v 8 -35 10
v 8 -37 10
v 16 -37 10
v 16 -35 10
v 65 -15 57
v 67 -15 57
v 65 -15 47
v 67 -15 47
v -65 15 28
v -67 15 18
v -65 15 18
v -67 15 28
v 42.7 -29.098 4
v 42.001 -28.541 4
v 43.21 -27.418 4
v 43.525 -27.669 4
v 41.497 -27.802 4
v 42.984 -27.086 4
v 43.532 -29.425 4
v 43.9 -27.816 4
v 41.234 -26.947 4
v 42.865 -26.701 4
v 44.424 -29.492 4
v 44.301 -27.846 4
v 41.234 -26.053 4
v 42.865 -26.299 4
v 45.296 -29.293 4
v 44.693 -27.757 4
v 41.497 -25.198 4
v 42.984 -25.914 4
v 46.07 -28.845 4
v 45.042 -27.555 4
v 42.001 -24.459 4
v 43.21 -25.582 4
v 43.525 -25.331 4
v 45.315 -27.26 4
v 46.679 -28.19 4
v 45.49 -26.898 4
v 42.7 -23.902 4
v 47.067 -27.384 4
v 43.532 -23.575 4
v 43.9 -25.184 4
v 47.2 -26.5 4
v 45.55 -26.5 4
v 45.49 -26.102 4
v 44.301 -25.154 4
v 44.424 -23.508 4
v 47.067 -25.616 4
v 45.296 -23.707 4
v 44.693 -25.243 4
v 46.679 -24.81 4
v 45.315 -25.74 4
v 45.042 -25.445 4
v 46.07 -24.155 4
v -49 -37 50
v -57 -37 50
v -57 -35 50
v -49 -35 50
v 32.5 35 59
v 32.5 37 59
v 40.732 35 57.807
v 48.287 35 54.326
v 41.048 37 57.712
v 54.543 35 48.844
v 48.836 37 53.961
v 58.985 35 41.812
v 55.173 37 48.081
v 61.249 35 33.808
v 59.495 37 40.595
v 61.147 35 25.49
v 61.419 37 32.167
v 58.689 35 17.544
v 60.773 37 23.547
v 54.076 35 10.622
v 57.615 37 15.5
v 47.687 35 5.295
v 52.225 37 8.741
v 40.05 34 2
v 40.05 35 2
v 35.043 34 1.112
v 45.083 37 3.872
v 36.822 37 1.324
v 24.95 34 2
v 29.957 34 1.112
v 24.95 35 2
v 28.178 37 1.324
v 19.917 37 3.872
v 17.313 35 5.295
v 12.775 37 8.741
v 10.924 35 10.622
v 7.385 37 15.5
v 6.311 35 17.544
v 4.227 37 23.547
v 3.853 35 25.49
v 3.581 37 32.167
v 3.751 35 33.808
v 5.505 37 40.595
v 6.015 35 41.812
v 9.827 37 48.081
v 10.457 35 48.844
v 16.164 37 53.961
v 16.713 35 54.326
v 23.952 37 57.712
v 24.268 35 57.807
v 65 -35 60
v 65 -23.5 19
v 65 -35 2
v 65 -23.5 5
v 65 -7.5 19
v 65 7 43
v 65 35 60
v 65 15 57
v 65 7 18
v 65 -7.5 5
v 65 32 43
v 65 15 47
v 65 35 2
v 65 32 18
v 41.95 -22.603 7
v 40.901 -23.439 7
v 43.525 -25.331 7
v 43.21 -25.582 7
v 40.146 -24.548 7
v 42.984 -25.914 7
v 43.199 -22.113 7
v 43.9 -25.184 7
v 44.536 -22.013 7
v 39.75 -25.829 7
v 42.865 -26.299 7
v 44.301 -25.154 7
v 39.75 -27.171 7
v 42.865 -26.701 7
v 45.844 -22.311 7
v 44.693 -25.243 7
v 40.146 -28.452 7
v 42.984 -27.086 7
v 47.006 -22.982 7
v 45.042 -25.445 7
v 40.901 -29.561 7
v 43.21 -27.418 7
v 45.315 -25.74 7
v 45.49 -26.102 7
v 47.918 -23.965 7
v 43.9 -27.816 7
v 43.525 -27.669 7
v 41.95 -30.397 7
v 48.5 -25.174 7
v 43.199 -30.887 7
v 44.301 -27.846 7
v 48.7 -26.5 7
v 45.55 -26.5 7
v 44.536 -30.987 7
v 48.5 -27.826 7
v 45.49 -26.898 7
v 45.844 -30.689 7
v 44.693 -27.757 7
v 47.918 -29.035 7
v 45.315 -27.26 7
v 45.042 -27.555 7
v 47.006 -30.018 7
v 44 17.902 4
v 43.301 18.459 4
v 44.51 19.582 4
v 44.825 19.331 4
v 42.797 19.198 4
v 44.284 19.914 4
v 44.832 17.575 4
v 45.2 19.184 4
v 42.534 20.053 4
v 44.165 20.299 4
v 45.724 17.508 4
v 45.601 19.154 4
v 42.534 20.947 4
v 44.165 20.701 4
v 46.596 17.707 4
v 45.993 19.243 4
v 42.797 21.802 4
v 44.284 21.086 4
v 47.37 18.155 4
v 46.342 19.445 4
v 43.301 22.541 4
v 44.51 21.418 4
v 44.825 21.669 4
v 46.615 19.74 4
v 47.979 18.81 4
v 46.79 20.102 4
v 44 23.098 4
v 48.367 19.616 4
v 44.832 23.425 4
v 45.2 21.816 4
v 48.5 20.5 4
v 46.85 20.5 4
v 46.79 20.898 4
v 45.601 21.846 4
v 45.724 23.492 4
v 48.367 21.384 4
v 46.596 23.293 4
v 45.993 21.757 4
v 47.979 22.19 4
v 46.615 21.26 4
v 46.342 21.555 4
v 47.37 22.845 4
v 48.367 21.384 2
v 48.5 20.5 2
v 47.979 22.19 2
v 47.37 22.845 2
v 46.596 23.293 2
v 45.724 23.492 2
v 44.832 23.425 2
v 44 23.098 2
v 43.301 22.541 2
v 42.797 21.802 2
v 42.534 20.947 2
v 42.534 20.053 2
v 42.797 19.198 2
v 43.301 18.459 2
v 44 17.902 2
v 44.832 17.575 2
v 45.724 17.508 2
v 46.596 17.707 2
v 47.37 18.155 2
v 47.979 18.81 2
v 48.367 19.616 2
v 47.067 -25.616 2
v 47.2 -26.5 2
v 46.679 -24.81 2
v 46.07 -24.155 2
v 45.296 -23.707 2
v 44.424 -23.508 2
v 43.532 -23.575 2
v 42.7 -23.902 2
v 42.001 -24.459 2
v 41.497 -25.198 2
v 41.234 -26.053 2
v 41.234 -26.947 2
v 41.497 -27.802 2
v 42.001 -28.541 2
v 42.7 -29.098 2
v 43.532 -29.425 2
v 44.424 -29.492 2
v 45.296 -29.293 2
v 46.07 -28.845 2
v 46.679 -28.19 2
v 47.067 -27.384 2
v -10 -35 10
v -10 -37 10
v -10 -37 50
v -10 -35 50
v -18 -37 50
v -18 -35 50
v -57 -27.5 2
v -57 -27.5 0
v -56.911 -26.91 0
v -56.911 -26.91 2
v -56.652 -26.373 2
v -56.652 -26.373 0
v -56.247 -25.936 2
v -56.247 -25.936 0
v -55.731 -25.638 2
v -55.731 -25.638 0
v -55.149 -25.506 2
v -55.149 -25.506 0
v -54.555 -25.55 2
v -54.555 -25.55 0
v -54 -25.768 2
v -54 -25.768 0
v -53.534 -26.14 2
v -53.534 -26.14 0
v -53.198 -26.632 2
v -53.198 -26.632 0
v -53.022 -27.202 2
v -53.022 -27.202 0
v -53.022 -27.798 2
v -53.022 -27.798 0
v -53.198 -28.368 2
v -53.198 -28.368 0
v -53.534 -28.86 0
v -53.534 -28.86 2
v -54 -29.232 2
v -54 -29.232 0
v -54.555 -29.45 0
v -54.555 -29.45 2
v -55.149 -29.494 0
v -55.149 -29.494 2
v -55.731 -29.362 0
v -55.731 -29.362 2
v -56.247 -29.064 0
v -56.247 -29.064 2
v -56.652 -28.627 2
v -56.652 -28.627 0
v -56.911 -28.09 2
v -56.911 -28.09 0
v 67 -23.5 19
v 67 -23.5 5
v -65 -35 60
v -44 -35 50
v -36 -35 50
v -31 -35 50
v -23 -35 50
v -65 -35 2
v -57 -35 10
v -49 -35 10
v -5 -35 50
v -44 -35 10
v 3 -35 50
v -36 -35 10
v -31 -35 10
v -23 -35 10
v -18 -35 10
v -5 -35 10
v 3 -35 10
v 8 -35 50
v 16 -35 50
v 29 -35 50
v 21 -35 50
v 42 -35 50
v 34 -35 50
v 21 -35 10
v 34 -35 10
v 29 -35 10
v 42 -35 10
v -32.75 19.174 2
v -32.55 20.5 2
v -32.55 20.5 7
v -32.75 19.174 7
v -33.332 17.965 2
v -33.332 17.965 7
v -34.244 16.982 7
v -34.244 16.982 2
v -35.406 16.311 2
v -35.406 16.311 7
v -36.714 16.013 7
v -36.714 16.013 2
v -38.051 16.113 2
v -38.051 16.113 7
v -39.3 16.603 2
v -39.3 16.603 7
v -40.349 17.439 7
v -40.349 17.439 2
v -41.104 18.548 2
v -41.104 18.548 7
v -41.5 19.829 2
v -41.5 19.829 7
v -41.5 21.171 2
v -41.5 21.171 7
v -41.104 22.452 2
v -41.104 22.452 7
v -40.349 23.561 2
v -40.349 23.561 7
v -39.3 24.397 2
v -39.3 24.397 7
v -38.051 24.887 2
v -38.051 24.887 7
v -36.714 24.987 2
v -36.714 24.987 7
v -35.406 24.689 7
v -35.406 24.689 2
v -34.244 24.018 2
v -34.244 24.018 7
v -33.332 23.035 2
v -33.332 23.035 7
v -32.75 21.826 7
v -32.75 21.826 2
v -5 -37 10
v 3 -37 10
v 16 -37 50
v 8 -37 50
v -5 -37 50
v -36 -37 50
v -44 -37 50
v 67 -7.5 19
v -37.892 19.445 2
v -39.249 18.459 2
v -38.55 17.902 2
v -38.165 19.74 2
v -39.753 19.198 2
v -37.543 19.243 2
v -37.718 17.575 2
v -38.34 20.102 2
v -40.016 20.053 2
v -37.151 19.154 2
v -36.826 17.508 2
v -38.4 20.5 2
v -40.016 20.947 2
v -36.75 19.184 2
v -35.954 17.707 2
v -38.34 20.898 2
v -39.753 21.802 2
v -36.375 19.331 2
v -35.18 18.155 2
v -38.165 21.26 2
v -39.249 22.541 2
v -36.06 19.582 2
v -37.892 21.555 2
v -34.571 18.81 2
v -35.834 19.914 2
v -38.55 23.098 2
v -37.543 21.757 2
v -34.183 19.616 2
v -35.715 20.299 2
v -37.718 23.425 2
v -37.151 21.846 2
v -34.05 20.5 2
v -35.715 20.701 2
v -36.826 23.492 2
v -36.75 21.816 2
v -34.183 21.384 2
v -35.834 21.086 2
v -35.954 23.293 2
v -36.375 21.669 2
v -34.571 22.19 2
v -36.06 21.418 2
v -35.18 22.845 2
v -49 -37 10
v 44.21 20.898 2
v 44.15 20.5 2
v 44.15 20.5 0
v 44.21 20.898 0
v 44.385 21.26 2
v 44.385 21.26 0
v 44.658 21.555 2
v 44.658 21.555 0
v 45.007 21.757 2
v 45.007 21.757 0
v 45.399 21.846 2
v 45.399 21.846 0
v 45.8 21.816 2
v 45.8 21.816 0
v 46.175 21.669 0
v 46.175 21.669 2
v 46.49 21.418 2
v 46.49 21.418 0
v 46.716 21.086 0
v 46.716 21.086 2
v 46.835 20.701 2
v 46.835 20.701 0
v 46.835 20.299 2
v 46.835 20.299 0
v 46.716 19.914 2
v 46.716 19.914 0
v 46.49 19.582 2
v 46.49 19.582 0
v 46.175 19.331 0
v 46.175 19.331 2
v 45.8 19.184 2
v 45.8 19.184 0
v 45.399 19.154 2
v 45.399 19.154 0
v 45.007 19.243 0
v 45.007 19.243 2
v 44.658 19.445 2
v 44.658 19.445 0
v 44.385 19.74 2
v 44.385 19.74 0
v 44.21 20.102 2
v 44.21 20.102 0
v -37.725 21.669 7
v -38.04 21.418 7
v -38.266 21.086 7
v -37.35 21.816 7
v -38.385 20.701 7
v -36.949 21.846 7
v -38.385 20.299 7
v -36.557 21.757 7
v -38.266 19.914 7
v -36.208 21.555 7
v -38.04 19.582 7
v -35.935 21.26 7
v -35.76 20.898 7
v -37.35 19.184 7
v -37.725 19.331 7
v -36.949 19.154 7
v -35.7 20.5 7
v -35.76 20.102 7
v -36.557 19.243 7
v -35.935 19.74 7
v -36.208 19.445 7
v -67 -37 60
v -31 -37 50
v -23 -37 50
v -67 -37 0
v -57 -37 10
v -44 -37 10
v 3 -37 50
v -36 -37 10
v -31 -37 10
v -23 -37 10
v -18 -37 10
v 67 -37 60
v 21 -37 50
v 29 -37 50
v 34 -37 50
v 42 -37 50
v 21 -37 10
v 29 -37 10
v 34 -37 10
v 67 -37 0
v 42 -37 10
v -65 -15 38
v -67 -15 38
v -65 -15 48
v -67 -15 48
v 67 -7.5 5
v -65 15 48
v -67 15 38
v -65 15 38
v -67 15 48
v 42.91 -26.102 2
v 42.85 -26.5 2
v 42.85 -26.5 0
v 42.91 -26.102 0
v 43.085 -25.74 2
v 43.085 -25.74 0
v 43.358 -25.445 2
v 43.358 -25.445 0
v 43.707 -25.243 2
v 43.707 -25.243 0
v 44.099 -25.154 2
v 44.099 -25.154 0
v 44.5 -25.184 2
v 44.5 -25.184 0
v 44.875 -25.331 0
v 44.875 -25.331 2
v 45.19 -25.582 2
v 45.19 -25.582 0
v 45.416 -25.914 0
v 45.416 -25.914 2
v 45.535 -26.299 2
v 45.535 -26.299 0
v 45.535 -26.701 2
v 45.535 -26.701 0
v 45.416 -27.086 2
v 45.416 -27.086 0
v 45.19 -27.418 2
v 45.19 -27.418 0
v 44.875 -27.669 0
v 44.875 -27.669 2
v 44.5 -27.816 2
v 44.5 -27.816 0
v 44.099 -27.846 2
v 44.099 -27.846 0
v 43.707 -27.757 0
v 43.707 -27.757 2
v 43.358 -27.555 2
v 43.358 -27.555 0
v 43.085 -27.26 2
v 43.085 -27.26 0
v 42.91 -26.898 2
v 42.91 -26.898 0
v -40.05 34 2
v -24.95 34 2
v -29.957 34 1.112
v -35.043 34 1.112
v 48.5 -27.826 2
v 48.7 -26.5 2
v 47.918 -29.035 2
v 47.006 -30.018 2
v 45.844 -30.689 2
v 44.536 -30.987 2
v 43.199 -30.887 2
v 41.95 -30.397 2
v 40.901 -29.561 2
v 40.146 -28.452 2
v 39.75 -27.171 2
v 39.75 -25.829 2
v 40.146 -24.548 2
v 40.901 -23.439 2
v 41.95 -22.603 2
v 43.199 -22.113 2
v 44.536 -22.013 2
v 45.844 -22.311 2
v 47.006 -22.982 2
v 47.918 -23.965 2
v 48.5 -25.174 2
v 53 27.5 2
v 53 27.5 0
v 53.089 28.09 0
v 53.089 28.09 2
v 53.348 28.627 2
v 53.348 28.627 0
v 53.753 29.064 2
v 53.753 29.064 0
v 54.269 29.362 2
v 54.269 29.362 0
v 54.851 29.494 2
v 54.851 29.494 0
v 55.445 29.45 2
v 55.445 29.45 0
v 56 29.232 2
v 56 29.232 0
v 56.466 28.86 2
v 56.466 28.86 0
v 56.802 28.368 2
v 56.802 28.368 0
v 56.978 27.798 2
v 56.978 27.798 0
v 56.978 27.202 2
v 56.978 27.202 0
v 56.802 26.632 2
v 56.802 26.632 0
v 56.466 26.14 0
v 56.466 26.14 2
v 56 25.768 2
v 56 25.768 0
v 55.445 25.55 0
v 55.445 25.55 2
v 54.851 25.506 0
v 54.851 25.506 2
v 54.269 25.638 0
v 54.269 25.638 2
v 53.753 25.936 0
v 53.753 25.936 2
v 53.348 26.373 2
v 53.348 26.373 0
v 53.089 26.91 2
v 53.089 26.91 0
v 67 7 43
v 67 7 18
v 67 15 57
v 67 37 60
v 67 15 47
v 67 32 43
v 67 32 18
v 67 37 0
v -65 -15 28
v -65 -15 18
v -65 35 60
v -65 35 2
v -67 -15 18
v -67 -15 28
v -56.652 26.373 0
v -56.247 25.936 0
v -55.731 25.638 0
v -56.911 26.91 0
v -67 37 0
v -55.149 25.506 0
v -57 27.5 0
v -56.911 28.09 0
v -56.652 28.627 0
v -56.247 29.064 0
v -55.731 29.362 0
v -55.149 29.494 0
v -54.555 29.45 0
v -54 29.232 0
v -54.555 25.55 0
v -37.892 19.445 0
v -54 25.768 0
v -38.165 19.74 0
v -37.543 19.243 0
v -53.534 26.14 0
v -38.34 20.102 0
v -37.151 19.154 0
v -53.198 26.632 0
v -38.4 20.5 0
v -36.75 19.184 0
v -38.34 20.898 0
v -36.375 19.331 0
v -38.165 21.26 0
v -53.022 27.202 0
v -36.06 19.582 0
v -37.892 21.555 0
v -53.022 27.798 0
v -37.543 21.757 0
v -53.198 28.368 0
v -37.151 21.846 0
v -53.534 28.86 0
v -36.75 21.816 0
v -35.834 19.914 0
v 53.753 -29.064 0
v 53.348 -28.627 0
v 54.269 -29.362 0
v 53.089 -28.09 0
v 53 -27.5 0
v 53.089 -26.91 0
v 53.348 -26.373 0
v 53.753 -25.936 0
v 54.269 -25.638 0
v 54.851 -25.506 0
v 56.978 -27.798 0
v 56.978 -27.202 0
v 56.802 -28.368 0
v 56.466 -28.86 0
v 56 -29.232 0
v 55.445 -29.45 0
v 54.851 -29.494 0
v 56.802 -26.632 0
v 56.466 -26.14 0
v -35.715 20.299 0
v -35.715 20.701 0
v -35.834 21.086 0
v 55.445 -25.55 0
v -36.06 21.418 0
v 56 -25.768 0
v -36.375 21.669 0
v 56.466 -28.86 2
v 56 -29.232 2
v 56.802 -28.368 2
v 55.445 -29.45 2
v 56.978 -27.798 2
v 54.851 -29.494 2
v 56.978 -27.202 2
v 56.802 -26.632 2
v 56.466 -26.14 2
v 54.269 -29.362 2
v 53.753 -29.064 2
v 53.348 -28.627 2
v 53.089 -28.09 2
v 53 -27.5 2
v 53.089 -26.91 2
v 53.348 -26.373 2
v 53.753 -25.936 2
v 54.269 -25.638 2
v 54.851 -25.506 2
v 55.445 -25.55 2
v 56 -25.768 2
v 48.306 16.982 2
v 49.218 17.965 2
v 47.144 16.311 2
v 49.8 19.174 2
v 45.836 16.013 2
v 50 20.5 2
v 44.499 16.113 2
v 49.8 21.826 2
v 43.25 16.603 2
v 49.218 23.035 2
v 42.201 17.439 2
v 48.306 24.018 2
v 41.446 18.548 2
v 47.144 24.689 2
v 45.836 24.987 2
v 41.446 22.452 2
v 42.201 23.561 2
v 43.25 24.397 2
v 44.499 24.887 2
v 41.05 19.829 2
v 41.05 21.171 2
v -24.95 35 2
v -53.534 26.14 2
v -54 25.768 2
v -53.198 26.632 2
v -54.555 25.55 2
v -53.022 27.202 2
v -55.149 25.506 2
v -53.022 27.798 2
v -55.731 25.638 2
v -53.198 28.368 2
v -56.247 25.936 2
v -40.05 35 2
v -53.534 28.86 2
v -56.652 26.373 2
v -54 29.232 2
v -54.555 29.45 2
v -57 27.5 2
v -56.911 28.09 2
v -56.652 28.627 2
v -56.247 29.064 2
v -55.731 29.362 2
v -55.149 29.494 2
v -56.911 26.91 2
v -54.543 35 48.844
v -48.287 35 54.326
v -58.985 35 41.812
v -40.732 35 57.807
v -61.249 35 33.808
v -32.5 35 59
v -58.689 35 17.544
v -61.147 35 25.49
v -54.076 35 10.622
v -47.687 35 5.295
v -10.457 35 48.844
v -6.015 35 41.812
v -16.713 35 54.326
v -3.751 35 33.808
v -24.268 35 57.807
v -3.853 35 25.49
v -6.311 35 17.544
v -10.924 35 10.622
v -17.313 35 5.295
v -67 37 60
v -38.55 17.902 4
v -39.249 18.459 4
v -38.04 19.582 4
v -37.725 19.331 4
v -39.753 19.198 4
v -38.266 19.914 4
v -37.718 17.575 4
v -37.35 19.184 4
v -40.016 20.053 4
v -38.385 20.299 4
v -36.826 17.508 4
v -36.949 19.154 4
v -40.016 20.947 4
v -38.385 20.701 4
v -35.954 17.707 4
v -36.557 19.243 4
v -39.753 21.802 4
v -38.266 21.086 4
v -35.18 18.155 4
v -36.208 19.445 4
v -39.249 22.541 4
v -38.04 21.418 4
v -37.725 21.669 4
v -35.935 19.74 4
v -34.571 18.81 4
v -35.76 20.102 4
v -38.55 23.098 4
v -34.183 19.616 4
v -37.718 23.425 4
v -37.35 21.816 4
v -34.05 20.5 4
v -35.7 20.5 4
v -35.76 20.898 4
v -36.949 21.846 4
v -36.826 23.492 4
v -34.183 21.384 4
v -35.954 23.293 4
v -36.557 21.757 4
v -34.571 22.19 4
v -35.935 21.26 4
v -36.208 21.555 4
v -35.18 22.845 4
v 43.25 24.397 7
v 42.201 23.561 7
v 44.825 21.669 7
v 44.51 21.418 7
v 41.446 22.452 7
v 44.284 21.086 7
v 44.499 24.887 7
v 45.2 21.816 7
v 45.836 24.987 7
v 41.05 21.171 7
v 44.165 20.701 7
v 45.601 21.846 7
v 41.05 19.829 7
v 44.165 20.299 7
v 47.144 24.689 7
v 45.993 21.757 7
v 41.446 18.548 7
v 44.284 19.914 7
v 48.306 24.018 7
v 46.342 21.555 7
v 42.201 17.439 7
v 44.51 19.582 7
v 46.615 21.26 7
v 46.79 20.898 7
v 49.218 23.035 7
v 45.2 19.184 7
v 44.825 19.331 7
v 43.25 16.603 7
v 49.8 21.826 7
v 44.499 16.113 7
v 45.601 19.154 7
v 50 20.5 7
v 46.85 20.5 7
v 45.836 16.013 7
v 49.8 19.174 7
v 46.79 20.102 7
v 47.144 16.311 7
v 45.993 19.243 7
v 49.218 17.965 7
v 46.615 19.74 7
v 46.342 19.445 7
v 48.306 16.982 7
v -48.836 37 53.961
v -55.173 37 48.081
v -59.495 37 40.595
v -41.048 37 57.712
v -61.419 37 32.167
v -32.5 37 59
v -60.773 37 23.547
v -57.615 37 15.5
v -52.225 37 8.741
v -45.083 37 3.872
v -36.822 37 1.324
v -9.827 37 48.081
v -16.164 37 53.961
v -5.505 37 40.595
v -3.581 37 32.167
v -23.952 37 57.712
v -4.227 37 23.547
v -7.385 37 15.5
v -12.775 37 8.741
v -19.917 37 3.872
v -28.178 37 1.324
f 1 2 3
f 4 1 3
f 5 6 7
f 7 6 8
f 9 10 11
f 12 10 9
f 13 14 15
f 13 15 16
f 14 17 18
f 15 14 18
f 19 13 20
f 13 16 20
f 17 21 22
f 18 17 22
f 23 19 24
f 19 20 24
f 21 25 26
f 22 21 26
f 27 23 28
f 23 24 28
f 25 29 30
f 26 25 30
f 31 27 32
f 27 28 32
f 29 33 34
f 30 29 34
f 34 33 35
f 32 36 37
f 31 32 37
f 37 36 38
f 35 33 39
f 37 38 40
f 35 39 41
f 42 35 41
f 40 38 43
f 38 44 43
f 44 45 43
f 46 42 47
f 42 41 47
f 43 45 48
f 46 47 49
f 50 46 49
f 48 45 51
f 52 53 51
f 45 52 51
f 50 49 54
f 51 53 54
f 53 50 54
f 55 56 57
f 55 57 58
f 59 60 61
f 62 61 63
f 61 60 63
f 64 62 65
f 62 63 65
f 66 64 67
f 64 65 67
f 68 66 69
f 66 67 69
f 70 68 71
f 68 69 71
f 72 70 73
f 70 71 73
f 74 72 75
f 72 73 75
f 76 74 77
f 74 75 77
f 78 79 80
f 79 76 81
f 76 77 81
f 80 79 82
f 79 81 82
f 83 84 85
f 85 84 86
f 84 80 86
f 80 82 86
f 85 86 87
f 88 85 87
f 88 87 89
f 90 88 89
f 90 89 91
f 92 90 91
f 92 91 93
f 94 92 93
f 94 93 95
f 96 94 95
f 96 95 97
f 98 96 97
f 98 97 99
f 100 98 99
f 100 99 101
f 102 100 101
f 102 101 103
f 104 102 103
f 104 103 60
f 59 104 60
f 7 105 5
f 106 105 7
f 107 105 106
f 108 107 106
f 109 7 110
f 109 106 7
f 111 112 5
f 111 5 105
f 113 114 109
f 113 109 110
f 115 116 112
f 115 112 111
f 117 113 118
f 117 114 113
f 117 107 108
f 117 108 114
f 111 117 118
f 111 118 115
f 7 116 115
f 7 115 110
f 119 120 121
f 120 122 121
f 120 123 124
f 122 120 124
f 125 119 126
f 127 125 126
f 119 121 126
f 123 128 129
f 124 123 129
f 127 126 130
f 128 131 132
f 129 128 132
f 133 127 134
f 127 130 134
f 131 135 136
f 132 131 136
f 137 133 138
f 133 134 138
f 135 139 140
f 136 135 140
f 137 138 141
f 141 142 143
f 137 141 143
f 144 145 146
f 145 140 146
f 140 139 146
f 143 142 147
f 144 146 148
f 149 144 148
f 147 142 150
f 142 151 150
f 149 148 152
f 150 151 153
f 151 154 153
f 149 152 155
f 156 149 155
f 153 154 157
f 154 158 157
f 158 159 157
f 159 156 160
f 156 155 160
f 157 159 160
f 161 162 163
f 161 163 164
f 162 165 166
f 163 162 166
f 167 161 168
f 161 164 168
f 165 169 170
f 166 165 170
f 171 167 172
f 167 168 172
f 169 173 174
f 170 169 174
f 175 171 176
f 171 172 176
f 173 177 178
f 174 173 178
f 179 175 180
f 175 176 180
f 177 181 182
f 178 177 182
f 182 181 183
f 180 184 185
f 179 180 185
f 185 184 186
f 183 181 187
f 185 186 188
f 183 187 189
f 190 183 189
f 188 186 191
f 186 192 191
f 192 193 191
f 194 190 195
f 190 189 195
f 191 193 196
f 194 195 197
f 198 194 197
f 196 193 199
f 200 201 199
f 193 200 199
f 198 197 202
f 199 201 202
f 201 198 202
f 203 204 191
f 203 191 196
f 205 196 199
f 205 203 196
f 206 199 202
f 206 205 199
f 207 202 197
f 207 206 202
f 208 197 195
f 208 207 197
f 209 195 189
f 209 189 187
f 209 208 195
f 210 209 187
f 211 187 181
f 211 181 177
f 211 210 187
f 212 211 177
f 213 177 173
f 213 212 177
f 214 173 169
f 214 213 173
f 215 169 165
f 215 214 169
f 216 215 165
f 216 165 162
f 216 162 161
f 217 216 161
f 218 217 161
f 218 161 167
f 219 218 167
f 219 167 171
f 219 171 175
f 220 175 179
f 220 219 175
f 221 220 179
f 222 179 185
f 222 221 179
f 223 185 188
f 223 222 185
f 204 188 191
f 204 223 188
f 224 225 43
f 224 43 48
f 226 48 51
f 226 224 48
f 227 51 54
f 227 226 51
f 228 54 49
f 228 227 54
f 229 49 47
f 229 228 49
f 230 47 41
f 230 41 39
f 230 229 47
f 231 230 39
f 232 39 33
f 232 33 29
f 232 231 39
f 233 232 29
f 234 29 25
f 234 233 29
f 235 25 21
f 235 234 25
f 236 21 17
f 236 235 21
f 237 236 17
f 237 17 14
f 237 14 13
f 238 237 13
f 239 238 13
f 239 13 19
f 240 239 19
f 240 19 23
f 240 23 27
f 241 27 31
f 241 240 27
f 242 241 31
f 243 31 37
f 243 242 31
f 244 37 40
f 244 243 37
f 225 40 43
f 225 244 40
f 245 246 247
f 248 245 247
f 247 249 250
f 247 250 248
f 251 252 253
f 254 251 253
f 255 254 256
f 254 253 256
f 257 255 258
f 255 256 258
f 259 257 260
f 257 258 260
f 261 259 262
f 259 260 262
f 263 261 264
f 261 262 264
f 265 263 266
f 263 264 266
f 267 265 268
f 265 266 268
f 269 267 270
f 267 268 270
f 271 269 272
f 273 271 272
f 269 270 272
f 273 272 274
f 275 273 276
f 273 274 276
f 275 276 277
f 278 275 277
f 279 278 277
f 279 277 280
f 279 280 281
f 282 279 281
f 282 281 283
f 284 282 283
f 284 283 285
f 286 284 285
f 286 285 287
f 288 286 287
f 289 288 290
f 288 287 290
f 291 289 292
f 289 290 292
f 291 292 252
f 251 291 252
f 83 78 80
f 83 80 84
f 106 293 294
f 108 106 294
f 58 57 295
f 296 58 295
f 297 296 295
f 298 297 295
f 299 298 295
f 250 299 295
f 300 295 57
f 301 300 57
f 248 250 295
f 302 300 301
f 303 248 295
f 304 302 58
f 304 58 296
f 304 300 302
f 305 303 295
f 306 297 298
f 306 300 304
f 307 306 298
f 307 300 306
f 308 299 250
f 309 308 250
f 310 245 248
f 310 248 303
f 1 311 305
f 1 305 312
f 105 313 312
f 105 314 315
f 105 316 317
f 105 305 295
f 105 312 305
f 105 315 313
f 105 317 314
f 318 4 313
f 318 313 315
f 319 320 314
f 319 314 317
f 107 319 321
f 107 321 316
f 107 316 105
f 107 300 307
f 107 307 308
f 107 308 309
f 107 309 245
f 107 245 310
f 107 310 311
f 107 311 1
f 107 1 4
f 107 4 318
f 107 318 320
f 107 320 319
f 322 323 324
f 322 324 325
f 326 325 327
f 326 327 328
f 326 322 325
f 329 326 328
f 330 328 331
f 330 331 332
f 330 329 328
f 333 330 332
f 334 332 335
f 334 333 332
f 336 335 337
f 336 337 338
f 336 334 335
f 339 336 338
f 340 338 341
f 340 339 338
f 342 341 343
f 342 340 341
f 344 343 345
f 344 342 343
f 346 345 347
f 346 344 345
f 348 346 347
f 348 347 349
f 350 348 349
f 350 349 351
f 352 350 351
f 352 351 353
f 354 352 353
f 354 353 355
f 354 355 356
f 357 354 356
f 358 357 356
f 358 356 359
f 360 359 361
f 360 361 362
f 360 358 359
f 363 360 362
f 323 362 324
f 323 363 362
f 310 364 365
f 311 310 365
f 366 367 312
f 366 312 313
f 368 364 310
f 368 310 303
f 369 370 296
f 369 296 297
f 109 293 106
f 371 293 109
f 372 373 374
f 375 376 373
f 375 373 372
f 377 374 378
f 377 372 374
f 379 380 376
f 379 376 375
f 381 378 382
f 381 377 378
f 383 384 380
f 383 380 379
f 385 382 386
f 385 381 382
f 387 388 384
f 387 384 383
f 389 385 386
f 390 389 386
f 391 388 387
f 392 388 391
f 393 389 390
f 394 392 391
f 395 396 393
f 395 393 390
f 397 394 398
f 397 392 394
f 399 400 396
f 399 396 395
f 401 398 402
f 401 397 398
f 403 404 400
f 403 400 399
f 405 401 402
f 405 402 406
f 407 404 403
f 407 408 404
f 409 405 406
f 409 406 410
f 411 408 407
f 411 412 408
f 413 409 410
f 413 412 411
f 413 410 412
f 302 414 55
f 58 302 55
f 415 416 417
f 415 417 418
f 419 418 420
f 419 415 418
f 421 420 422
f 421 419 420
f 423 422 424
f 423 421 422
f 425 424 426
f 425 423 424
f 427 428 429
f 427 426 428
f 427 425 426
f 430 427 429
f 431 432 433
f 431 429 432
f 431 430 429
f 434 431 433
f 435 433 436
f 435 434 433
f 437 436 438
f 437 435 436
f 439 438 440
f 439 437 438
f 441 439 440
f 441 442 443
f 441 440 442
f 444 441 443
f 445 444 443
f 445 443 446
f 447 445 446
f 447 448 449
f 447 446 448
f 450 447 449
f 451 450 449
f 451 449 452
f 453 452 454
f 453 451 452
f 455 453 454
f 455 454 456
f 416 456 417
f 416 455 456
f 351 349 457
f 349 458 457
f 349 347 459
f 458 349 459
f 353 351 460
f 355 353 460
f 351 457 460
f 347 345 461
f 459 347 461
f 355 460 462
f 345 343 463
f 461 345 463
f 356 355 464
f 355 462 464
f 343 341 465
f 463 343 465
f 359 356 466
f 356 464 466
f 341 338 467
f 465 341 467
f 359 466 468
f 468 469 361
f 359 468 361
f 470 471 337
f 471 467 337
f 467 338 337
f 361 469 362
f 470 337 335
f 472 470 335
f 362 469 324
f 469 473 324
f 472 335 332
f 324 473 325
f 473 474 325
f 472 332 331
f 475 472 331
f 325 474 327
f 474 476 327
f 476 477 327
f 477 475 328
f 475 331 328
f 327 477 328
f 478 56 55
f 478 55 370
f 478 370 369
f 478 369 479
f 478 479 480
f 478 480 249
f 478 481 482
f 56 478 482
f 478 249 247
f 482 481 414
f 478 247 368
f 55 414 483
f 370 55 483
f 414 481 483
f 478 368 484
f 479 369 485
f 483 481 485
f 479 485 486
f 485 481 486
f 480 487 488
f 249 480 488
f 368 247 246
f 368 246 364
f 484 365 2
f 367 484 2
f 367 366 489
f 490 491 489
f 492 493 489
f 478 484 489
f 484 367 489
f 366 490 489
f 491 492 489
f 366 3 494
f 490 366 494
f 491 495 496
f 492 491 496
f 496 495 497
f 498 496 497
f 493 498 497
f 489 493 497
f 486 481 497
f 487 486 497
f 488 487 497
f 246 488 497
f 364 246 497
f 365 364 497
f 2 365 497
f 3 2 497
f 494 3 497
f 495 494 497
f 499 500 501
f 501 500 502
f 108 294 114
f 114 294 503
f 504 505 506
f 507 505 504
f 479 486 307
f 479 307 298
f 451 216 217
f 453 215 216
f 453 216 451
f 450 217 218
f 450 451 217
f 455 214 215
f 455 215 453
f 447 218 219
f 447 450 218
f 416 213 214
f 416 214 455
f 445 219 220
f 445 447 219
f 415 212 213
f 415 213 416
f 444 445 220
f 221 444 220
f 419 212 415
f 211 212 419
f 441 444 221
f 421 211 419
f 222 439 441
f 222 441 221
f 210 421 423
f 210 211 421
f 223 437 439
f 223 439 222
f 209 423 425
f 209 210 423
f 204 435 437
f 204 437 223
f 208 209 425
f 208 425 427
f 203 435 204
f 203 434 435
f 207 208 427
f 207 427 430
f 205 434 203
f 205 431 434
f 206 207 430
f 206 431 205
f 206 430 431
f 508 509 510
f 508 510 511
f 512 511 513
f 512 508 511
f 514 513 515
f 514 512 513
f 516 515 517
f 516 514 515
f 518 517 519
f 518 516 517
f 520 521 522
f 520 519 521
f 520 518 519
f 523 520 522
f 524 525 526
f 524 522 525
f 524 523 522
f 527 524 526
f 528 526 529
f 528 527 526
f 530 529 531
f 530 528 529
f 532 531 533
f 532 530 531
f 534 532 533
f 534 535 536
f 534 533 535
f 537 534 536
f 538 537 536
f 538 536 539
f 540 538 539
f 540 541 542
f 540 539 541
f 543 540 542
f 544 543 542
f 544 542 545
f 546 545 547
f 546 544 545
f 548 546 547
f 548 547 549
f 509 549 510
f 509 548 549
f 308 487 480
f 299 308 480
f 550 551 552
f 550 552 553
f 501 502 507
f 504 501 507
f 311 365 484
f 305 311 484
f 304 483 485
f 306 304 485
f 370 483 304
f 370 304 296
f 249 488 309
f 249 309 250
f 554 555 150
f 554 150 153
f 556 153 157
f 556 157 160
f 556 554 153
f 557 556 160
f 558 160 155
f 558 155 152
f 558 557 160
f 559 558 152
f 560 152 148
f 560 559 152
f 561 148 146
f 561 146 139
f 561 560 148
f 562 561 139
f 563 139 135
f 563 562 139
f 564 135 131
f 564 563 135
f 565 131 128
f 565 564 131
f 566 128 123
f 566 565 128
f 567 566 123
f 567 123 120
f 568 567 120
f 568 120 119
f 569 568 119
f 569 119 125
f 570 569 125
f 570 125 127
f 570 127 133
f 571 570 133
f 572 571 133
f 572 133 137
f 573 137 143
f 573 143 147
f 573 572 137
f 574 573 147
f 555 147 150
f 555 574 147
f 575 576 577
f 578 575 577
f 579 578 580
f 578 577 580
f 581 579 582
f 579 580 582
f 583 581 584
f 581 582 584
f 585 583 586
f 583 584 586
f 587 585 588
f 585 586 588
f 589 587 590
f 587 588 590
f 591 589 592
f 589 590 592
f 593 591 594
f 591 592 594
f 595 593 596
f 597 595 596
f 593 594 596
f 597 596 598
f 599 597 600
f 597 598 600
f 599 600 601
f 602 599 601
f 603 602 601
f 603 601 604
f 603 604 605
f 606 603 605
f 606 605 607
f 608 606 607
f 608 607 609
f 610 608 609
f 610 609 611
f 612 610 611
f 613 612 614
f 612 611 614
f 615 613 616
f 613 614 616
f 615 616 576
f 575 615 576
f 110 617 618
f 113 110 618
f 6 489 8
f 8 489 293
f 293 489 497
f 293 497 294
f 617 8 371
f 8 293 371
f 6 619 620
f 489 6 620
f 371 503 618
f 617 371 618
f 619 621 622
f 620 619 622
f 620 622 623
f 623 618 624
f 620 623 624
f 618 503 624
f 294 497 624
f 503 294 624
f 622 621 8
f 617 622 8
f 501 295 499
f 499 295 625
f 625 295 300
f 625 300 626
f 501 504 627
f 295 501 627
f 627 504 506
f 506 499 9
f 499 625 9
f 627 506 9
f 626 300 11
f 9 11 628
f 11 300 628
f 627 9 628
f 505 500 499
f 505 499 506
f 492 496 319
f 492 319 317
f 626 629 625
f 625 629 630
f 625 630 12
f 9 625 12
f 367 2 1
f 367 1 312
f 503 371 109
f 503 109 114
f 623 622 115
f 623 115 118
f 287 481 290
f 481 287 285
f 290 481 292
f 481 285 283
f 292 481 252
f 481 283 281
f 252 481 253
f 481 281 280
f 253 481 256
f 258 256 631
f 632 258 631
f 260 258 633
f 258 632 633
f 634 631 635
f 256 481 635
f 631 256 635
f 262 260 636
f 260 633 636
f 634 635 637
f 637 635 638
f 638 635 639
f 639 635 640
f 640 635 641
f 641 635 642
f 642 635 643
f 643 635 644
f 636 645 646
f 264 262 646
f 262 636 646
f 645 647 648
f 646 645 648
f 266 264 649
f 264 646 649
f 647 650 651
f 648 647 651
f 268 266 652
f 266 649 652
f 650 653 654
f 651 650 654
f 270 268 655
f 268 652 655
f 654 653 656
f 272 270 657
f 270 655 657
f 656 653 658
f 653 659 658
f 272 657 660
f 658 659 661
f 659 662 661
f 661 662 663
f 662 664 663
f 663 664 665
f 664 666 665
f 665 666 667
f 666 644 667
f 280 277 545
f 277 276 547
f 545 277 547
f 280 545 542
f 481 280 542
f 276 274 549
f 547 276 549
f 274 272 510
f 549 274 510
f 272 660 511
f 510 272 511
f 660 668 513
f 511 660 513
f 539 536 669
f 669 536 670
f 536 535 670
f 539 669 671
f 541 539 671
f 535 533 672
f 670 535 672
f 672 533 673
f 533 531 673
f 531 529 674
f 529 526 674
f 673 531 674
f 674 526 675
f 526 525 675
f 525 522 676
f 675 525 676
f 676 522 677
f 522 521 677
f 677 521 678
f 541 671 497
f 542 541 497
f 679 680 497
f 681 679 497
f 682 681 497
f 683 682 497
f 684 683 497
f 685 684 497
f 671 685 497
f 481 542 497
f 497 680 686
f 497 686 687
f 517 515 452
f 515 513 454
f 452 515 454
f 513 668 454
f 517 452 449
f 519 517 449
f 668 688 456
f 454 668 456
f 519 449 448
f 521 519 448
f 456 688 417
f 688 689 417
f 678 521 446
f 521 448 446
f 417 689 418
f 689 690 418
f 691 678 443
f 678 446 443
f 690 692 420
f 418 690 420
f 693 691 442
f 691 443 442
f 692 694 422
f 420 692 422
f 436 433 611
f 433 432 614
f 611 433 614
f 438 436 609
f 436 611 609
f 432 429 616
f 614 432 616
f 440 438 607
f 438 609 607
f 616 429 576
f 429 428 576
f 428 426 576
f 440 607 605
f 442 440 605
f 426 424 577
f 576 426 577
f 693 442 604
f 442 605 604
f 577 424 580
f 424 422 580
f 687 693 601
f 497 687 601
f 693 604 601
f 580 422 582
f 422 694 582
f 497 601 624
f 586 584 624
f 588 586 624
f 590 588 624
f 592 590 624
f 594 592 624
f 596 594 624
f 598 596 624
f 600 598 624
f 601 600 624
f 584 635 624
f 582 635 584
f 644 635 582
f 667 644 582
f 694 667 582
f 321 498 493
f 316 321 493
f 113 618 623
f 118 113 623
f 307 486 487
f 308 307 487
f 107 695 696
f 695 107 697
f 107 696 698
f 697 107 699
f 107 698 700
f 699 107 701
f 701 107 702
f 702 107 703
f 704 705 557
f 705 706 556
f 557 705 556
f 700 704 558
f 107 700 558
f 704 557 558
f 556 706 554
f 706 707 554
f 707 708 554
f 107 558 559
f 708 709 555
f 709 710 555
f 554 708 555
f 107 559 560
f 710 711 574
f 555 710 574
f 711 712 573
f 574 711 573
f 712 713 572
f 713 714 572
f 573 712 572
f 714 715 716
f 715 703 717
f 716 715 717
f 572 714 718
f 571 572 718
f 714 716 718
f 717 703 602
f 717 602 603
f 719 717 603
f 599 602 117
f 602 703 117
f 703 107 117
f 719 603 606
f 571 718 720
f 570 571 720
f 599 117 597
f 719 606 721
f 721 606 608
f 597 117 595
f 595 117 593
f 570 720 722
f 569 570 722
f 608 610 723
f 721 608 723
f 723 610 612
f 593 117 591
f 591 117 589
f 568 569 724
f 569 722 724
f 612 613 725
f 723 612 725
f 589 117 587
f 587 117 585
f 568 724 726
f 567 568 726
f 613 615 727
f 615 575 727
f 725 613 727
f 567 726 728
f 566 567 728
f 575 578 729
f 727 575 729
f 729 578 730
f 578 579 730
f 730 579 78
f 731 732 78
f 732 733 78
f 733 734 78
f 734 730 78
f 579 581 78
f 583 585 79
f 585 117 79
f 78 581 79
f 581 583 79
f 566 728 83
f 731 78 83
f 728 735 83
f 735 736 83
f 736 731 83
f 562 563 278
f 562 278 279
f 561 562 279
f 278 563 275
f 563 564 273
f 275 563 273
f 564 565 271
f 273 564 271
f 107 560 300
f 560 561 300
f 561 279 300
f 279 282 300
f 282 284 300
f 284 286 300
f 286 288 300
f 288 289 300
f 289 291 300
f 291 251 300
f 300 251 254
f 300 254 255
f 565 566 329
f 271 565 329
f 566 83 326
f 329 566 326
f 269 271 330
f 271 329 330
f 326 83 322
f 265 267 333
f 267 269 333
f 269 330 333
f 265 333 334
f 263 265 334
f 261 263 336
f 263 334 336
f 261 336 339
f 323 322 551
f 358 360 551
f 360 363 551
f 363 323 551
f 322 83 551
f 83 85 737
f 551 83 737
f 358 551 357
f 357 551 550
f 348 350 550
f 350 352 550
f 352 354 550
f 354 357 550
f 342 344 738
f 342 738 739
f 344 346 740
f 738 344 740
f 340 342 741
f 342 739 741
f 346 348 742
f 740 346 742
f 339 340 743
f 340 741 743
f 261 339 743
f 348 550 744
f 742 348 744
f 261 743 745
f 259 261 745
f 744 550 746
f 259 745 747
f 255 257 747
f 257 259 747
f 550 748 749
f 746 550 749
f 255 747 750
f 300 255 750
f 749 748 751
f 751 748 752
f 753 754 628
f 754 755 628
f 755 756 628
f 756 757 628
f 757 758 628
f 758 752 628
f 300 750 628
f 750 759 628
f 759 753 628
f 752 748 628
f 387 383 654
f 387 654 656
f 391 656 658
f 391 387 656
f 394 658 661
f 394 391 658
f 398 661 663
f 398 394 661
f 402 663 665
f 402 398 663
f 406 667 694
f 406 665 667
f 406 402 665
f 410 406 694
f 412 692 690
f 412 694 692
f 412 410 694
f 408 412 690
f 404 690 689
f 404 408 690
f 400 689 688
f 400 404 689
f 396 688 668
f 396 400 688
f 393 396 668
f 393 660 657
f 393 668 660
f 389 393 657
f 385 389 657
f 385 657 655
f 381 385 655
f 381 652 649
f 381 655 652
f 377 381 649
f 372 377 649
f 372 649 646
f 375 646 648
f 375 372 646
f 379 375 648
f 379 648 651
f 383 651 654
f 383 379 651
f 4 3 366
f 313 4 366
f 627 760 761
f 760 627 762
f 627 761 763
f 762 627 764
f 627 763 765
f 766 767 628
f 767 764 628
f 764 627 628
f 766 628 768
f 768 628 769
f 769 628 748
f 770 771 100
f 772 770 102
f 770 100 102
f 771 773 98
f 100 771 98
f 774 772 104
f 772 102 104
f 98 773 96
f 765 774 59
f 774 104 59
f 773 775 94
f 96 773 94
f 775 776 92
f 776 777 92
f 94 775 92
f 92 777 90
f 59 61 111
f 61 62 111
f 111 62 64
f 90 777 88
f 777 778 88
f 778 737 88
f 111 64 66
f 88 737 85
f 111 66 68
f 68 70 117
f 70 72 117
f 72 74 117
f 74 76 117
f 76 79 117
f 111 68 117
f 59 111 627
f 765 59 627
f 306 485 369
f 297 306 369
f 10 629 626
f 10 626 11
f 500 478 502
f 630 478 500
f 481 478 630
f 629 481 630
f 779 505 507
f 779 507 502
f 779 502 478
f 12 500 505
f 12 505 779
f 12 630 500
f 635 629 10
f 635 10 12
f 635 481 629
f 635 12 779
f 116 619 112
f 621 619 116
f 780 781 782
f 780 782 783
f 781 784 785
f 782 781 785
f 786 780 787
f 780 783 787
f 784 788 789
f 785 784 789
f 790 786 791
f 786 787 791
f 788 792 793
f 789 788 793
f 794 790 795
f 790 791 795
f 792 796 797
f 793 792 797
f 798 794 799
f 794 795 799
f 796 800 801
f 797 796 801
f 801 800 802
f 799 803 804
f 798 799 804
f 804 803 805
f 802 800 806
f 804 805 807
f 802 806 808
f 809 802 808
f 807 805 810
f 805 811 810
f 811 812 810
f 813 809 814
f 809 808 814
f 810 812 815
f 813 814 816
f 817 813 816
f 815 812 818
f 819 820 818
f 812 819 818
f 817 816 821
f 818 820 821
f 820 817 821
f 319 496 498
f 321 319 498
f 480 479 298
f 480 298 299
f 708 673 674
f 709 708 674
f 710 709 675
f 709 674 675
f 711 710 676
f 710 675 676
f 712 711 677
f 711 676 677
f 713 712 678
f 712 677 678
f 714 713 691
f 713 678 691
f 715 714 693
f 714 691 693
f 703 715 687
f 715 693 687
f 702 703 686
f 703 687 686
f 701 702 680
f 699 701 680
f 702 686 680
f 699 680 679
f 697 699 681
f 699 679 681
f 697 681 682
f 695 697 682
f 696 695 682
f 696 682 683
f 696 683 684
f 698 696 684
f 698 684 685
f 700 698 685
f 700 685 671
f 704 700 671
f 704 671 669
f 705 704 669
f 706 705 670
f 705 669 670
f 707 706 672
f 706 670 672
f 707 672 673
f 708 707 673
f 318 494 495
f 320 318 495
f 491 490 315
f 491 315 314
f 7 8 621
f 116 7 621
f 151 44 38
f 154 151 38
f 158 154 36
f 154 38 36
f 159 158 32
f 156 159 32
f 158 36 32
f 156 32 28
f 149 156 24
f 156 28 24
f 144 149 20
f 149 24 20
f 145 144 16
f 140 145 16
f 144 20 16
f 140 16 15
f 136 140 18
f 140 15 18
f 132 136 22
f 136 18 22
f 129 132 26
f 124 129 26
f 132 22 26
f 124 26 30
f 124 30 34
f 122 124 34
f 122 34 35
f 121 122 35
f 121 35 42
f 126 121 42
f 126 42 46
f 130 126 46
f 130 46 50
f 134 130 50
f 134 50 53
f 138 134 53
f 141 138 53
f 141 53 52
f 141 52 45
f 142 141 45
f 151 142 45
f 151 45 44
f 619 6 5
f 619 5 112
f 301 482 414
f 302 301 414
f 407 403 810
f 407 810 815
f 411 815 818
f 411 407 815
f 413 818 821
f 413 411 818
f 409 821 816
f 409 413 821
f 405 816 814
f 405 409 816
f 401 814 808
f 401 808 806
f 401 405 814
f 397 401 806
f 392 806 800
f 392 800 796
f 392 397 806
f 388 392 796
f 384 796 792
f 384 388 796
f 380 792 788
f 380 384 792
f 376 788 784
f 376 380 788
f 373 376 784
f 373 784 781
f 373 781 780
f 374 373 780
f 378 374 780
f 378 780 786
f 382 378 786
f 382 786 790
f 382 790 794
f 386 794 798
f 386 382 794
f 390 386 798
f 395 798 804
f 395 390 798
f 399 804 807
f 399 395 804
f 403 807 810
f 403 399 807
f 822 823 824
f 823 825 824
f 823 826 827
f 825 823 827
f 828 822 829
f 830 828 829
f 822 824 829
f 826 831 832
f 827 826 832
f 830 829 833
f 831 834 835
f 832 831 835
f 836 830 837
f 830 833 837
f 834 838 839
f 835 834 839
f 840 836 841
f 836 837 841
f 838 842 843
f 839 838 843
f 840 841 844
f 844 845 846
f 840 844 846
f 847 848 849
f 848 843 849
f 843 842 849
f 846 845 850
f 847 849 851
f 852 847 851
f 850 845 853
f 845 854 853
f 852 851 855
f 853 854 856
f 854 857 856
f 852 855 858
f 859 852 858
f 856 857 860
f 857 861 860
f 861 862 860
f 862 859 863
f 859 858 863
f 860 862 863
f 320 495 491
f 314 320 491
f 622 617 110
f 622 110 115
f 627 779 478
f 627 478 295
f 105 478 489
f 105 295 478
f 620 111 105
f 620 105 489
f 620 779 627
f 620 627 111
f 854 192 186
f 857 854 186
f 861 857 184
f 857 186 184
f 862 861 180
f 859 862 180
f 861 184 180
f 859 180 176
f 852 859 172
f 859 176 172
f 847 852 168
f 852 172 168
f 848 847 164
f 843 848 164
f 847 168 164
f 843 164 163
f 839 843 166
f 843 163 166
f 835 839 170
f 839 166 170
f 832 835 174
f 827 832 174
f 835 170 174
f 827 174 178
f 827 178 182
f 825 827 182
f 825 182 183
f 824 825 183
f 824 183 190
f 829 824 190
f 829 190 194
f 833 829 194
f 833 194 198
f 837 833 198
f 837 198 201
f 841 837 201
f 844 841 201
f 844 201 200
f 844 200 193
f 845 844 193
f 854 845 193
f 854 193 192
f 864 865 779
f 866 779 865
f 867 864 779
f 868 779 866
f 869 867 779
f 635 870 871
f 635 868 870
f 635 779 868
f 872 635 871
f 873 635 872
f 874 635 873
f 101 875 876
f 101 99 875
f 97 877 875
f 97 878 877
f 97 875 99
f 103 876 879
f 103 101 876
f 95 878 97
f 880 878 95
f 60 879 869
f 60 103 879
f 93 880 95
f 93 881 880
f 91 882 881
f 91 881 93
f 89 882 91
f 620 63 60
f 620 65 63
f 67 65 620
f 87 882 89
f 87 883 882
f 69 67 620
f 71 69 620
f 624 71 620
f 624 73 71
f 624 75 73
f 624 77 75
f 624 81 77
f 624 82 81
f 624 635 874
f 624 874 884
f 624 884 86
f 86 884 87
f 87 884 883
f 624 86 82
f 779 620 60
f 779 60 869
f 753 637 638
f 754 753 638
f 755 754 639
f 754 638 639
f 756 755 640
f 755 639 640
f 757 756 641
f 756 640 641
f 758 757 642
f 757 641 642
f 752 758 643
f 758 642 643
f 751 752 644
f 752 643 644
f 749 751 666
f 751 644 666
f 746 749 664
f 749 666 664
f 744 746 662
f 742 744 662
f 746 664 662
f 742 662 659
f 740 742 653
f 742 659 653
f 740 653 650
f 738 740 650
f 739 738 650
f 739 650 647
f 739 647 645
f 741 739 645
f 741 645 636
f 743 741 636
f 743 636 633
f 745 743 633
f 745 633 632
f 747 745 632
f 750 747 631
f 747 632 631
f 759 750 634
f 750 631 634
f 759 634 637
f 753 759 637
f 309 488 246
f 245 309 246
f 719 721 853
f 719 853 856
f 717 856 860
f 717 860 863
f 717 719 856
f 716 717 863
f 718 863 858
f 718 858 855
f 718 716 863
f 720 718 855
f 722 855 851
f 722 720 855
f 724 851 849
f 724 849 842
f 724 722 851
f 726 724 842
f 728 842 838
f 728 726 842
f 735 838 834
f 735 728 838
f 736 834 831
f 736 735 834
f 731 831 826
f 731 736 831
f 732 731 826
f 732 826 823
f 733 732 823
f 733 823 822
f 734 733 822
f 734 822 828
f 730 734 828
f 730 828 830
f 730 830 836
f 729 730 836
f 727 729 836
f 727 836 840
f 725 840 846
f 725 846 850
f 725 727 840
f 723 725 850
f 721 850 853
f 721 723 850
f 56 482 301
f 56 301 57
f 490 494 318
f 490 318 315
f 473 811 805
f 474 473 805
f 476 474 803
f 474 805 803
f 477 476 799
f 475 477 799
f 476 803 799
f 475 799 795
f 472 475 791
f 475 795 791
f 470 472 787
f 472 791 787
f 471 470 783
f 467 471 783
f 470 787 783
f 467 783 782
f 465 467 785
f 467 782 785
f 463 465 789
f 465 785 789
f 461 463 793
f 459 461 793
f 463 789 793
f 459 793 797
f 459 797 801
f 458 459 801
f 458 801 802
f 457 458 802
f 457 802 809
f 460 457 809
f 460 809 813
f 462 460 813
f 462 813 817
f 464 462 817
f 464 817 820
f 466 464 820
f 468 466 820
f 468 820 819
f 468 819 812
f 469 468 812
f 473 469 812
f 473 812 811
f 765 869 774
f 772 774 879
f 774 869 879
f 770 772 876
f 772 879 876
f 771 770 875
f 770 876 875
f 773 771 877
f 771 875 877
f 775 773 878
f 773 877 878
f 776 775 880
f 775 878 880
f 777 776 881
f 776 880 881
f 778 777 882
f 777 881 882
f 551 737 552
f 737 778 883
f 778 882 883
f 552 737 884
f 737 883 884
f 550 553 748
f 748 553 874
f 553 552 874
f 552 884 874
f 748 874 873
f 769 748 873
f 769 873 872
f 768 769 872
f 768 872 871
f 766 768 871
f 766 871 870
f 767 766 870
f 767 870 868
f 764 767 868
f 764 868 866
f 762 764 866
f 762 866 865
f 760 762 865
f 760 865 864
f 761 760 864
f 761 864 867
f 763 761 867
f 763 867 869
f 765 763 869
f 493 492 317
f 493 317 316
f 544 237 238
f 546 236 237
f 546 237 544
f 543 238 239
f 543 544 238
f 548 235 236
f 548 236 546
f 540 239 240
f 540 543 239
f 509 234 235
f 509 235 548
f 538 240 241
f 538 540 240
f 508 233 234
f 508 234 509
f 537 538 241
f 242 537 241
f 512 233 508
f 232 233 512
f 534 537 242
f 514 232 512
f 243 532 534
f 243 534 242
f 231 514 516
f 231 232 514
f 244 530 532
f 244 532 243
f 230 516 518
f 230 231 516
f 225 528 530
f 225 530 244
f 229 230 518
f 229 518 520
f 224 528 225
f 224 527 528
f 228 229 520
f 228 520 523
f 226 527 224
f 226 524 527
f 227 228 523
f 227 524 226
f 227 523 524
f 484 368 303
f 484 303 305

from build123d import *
from build123d.topology import SkipClean

# Parameters (mm, degrees)
ESBO_O1_W                = 134
ESBO_O1_H                = 74
ESBO_O1_W_2              = 130
ESBO_O1_H_2              = 70
RESSALTO_EXTRUS_O1_DEPTH = 60
ESBO_O2_W                = 134
ESBO_O2_H                = 74
ESBO_O2_R                = 2
RESSALTO_EXTRUS_O2_DEPTH = 2
ESBO_O3_W                = 25
ESBO_O3_H                = 25
ESBO_O3_W_2              = 14
ESBO_O3_H_2              = 16
ESBO_O3_W_3              = 10
ESBO_O3_H_3              = 30
CORTE_EXTRUS_O1_DEPTH    = 10
ESBO_O6_W                = 8
ESBO_O6_H                = 40
CORTE_EXTRUS_O2_DEPTH    = 10
ESBO_O7_W                = 10
ESBO_O7_H                = 30
CORTE_EXTRUS_O3_DEPTH    = 12
ESBO_O8_R                = 4.5
ESBO_O8_R_2              = 1.35
RESSALTO_EXTRUS_O3_DEPTH = 5
ESBO_O8_3_R              = 1.35
CORTE_EXTRUS_O4_DEPTH    = 97.031244915
ESBO_O9_R                = 3
CORTE_EXTRUS_O5_DEPTH    = 2
ESBO_O10_R               = 29
CORTE_EXTRUS_O6_DEPTH    = 3


with BuildPart() as part:
    # Esboço1 → Ressalto-extrusão1 (new body)
    with BuildSketch(Plane.XY):
        Rectangle(ESBO_O1_W, ESBO_O1_H)
        Rectangle(ESBO_O1_W_2, ESBO_O1_H_2, mode=Mode.SUBTRACT)
    extrude(amount=RESSALTO_EXTRUS_O1_DEPTH)

    # Esboço2 → Ressalto-extrusão2 (add)
    with BuildSketch(Plane(origin=(0, 0, 0), x_dir=(-1, 0, 0), z_dir=(0, 0, -1))):
        Rectangle(ESBO_O2_W, ESBO_O2_H)
        with Locations((-55, -27.5)):
            Circle(ESBO_O2_R, mode=Mode.SUBTRACT)
        with Locations((55, -27.5)):
            Circle(ESBO_O2_R, mode=Mode.SUBTRACT)
        with Locations((55, 27.5)):
            Circle(ESBO_O2_R, mode=Mode.SUBTRACT)
        with Locations((-55, 27.5)):
            Circle(ESBO_O2_R, mode=Mode.SUBTRACT)
    extrude(amount=-RESSALTO_EXTRUS_O2_DEPTH)

    # Esboço3 → Corte-extrusão1 (cut)
    with BuildSketch(Plane(origin=(67, 0, 0), x_dir=(0, 0, -1), z_dir=(1, 0, 0))):
        with Locations((-30.5, 19.5)):
            Rectangle(ESBO_O3_W, ESBO_O3_H)
        with Locations((-12, -15.5)):
            Rectangle(ESBO_O3_W_2, ESBO_O3_H_2)
        with Locations((-52, 0)):
            Rectangle(ESBO_O3_W_3, ESBO_O3_H_3)
    extrude(amount=-CORTE_EXTRUS_O1_DEPTH, mode=Mode.SUBTRACT)

    # Esboço6 → Corte-extrusão2 (cut)
    with BuildSketch(Plane.XZ.offset(37)):
        with Locations((-53, 30)):
            Rectangle(ESBO_O6_W, ESBO_O6_H)
        with Locations((-40, 30)):
            Rectangle(ESBO_O6_W, ESBO_O6_H)
        with Locations((-27, 30)):
            Rectangle(ESBO_O6_W, ESBO_O6_H)
        with Locations((-14, 30)):
            Rectangle(ESBO_O6_W, ESBO_O6_H)
        with Locations((-1, 30)):
            Rectangle(ESBO_O6_W, ESBO_O6_H)
        with Locations((12, 30)):
            Rectangle(ESBO_O6_W, ESBO_O6_H)
        with Locations((25, 30)):
            Rectangle(ESBO_O6_W, ESBO_O6_H)
        with Locations((38, 30)):
            Rectangle(ESBO_O6_W, ESBO_O6_H)
    extrude(amount=-CORTE_EXTRUS_O2_DEPTH, mode=Mode.SUBTRACT)

    # Esboço7 → Corte-extrusão3 (cut)
    with BuildSketch(Plane.ZY.offset(67)):
        with Locations((43, 0)):
            Rectangle(ESBO_O7_W, ESBO_O7_H)
        with Locations((23, 0)):
            Rectangle(ESBO_O7_W, ESBO_O7_H)
    extrude(amount=-CORTE_EXTRUS_O3_DEPTH, mode=Mode.SUBTRACT)

    # Esboço8 → Ressalto-extrusão3 (add)
    # profile 1 of 3: a face of its own
    with BuildSketch(Plane(origin=(0, 0, 2), x_dir=(-1, 0, 0), z_dir=(0, 0, -1))):
        with Locations(Location((37.05, 20.5, 0), (0, 0, 180))):
            Circle(ESBO_O8_R)
        with Locations(Location((37.05, 20.5, 0), (0, 0, 180))):
            Circle(ESBO_O8_R_2, mode=Mode.SUBTRACT)
    # profile 2 of 3: a face of its own
    with BuildSketch(Plane(origin=(0, 0, 2), x_dir=(-1, 0, 0), z_dir=(0, 0, -1))):
        with Locations(Location((-45.5, 20.5, 0), (0, 0, 180))):
            Circle(ESBO_O8_R)
        with Locations(Location((-45.5, 20.5, 0), (0, 0, 180))):
            Circle(ESBO_O8_R_2, mode=Mode.SUBTRACT)
    # profile 3 of 3: a face of its own
    with BuildSketch(Plane(origin=(0, 0, 2), x_dir=(-1, 0, 0), z_dir=(0, 0, -1))):
        with Locations(Location((-44.2, -26.5, 0), (0, 0, 180))):
            Circle(ESBO_O8_R)
        with Locations(Location((-44.2, -26.5, 0), (0, 0, 180))):
            Circle(ESBO_O8_R_2, mode=Mode.SUBTRACT)
    extrude(amount=-RESSALTO_EXTRUS_O3_DEPTH)

    # Esboço8<3> → Corte-extrusão4 (cut, through all)
    with SkipClean():  # the faces are left unmerged after this step: merging them gives an invalid solid
        with BuildSketch(Plane(origin=(0, 0, 2), x_dir=(-1, 0, 0), z_dir=(0, 0, -1))):
            with Locations((-44.2, -26.5)):
                Circle(ESBO_O8_3_R)
            with Locations((37.05, 20.5)):
                Circle(ESBO_O8_3_R)
            with Locations((-45.5, 20.5)):
                Circle(ESBO_O8_3_R)
        extrude(amount=CORTE_EXTRUS_O4_DEPTH, mode=Mode.SUBTRACT)

    # Esboço9 → Corte-extrusão5 (cut)
    with BuildSketch(Plane.XY.offset(2)):
        with Locations((45.5, 20.5)):
            Circle(ESBO_O9_R)
        with Locations((44.2, -26.5)):
            Circle(ESBO_O9_R)
        with Locations((-37.05, 20.5)):
            Circle(ESBO_O9_R)
    extrude(amount=CORTE_EXTRUS_O5_DEPTH, mode=Mode.SUBTRACT)

    # Esboço10 → Corte-extrusão6 (cut)
    with BuildSketch(Plane(origin=(0, 37, 0), x_dir=(1, 0, 0), z_dir=(0, 1, 0))):
        with Locations(Location((32.5, -30, 0), (0, 0, 270))):
            Circle(ESBO_O10_R)
        with Locations(Location((-32.5, -30, 0), (0, 0, 270))):
            Circle(ESBO_O10_R)
    extrude(amount=-CORTE_EXTRUS_O6_DEPTH, mode=Mode.SUBTRACT)


solid = part.part
